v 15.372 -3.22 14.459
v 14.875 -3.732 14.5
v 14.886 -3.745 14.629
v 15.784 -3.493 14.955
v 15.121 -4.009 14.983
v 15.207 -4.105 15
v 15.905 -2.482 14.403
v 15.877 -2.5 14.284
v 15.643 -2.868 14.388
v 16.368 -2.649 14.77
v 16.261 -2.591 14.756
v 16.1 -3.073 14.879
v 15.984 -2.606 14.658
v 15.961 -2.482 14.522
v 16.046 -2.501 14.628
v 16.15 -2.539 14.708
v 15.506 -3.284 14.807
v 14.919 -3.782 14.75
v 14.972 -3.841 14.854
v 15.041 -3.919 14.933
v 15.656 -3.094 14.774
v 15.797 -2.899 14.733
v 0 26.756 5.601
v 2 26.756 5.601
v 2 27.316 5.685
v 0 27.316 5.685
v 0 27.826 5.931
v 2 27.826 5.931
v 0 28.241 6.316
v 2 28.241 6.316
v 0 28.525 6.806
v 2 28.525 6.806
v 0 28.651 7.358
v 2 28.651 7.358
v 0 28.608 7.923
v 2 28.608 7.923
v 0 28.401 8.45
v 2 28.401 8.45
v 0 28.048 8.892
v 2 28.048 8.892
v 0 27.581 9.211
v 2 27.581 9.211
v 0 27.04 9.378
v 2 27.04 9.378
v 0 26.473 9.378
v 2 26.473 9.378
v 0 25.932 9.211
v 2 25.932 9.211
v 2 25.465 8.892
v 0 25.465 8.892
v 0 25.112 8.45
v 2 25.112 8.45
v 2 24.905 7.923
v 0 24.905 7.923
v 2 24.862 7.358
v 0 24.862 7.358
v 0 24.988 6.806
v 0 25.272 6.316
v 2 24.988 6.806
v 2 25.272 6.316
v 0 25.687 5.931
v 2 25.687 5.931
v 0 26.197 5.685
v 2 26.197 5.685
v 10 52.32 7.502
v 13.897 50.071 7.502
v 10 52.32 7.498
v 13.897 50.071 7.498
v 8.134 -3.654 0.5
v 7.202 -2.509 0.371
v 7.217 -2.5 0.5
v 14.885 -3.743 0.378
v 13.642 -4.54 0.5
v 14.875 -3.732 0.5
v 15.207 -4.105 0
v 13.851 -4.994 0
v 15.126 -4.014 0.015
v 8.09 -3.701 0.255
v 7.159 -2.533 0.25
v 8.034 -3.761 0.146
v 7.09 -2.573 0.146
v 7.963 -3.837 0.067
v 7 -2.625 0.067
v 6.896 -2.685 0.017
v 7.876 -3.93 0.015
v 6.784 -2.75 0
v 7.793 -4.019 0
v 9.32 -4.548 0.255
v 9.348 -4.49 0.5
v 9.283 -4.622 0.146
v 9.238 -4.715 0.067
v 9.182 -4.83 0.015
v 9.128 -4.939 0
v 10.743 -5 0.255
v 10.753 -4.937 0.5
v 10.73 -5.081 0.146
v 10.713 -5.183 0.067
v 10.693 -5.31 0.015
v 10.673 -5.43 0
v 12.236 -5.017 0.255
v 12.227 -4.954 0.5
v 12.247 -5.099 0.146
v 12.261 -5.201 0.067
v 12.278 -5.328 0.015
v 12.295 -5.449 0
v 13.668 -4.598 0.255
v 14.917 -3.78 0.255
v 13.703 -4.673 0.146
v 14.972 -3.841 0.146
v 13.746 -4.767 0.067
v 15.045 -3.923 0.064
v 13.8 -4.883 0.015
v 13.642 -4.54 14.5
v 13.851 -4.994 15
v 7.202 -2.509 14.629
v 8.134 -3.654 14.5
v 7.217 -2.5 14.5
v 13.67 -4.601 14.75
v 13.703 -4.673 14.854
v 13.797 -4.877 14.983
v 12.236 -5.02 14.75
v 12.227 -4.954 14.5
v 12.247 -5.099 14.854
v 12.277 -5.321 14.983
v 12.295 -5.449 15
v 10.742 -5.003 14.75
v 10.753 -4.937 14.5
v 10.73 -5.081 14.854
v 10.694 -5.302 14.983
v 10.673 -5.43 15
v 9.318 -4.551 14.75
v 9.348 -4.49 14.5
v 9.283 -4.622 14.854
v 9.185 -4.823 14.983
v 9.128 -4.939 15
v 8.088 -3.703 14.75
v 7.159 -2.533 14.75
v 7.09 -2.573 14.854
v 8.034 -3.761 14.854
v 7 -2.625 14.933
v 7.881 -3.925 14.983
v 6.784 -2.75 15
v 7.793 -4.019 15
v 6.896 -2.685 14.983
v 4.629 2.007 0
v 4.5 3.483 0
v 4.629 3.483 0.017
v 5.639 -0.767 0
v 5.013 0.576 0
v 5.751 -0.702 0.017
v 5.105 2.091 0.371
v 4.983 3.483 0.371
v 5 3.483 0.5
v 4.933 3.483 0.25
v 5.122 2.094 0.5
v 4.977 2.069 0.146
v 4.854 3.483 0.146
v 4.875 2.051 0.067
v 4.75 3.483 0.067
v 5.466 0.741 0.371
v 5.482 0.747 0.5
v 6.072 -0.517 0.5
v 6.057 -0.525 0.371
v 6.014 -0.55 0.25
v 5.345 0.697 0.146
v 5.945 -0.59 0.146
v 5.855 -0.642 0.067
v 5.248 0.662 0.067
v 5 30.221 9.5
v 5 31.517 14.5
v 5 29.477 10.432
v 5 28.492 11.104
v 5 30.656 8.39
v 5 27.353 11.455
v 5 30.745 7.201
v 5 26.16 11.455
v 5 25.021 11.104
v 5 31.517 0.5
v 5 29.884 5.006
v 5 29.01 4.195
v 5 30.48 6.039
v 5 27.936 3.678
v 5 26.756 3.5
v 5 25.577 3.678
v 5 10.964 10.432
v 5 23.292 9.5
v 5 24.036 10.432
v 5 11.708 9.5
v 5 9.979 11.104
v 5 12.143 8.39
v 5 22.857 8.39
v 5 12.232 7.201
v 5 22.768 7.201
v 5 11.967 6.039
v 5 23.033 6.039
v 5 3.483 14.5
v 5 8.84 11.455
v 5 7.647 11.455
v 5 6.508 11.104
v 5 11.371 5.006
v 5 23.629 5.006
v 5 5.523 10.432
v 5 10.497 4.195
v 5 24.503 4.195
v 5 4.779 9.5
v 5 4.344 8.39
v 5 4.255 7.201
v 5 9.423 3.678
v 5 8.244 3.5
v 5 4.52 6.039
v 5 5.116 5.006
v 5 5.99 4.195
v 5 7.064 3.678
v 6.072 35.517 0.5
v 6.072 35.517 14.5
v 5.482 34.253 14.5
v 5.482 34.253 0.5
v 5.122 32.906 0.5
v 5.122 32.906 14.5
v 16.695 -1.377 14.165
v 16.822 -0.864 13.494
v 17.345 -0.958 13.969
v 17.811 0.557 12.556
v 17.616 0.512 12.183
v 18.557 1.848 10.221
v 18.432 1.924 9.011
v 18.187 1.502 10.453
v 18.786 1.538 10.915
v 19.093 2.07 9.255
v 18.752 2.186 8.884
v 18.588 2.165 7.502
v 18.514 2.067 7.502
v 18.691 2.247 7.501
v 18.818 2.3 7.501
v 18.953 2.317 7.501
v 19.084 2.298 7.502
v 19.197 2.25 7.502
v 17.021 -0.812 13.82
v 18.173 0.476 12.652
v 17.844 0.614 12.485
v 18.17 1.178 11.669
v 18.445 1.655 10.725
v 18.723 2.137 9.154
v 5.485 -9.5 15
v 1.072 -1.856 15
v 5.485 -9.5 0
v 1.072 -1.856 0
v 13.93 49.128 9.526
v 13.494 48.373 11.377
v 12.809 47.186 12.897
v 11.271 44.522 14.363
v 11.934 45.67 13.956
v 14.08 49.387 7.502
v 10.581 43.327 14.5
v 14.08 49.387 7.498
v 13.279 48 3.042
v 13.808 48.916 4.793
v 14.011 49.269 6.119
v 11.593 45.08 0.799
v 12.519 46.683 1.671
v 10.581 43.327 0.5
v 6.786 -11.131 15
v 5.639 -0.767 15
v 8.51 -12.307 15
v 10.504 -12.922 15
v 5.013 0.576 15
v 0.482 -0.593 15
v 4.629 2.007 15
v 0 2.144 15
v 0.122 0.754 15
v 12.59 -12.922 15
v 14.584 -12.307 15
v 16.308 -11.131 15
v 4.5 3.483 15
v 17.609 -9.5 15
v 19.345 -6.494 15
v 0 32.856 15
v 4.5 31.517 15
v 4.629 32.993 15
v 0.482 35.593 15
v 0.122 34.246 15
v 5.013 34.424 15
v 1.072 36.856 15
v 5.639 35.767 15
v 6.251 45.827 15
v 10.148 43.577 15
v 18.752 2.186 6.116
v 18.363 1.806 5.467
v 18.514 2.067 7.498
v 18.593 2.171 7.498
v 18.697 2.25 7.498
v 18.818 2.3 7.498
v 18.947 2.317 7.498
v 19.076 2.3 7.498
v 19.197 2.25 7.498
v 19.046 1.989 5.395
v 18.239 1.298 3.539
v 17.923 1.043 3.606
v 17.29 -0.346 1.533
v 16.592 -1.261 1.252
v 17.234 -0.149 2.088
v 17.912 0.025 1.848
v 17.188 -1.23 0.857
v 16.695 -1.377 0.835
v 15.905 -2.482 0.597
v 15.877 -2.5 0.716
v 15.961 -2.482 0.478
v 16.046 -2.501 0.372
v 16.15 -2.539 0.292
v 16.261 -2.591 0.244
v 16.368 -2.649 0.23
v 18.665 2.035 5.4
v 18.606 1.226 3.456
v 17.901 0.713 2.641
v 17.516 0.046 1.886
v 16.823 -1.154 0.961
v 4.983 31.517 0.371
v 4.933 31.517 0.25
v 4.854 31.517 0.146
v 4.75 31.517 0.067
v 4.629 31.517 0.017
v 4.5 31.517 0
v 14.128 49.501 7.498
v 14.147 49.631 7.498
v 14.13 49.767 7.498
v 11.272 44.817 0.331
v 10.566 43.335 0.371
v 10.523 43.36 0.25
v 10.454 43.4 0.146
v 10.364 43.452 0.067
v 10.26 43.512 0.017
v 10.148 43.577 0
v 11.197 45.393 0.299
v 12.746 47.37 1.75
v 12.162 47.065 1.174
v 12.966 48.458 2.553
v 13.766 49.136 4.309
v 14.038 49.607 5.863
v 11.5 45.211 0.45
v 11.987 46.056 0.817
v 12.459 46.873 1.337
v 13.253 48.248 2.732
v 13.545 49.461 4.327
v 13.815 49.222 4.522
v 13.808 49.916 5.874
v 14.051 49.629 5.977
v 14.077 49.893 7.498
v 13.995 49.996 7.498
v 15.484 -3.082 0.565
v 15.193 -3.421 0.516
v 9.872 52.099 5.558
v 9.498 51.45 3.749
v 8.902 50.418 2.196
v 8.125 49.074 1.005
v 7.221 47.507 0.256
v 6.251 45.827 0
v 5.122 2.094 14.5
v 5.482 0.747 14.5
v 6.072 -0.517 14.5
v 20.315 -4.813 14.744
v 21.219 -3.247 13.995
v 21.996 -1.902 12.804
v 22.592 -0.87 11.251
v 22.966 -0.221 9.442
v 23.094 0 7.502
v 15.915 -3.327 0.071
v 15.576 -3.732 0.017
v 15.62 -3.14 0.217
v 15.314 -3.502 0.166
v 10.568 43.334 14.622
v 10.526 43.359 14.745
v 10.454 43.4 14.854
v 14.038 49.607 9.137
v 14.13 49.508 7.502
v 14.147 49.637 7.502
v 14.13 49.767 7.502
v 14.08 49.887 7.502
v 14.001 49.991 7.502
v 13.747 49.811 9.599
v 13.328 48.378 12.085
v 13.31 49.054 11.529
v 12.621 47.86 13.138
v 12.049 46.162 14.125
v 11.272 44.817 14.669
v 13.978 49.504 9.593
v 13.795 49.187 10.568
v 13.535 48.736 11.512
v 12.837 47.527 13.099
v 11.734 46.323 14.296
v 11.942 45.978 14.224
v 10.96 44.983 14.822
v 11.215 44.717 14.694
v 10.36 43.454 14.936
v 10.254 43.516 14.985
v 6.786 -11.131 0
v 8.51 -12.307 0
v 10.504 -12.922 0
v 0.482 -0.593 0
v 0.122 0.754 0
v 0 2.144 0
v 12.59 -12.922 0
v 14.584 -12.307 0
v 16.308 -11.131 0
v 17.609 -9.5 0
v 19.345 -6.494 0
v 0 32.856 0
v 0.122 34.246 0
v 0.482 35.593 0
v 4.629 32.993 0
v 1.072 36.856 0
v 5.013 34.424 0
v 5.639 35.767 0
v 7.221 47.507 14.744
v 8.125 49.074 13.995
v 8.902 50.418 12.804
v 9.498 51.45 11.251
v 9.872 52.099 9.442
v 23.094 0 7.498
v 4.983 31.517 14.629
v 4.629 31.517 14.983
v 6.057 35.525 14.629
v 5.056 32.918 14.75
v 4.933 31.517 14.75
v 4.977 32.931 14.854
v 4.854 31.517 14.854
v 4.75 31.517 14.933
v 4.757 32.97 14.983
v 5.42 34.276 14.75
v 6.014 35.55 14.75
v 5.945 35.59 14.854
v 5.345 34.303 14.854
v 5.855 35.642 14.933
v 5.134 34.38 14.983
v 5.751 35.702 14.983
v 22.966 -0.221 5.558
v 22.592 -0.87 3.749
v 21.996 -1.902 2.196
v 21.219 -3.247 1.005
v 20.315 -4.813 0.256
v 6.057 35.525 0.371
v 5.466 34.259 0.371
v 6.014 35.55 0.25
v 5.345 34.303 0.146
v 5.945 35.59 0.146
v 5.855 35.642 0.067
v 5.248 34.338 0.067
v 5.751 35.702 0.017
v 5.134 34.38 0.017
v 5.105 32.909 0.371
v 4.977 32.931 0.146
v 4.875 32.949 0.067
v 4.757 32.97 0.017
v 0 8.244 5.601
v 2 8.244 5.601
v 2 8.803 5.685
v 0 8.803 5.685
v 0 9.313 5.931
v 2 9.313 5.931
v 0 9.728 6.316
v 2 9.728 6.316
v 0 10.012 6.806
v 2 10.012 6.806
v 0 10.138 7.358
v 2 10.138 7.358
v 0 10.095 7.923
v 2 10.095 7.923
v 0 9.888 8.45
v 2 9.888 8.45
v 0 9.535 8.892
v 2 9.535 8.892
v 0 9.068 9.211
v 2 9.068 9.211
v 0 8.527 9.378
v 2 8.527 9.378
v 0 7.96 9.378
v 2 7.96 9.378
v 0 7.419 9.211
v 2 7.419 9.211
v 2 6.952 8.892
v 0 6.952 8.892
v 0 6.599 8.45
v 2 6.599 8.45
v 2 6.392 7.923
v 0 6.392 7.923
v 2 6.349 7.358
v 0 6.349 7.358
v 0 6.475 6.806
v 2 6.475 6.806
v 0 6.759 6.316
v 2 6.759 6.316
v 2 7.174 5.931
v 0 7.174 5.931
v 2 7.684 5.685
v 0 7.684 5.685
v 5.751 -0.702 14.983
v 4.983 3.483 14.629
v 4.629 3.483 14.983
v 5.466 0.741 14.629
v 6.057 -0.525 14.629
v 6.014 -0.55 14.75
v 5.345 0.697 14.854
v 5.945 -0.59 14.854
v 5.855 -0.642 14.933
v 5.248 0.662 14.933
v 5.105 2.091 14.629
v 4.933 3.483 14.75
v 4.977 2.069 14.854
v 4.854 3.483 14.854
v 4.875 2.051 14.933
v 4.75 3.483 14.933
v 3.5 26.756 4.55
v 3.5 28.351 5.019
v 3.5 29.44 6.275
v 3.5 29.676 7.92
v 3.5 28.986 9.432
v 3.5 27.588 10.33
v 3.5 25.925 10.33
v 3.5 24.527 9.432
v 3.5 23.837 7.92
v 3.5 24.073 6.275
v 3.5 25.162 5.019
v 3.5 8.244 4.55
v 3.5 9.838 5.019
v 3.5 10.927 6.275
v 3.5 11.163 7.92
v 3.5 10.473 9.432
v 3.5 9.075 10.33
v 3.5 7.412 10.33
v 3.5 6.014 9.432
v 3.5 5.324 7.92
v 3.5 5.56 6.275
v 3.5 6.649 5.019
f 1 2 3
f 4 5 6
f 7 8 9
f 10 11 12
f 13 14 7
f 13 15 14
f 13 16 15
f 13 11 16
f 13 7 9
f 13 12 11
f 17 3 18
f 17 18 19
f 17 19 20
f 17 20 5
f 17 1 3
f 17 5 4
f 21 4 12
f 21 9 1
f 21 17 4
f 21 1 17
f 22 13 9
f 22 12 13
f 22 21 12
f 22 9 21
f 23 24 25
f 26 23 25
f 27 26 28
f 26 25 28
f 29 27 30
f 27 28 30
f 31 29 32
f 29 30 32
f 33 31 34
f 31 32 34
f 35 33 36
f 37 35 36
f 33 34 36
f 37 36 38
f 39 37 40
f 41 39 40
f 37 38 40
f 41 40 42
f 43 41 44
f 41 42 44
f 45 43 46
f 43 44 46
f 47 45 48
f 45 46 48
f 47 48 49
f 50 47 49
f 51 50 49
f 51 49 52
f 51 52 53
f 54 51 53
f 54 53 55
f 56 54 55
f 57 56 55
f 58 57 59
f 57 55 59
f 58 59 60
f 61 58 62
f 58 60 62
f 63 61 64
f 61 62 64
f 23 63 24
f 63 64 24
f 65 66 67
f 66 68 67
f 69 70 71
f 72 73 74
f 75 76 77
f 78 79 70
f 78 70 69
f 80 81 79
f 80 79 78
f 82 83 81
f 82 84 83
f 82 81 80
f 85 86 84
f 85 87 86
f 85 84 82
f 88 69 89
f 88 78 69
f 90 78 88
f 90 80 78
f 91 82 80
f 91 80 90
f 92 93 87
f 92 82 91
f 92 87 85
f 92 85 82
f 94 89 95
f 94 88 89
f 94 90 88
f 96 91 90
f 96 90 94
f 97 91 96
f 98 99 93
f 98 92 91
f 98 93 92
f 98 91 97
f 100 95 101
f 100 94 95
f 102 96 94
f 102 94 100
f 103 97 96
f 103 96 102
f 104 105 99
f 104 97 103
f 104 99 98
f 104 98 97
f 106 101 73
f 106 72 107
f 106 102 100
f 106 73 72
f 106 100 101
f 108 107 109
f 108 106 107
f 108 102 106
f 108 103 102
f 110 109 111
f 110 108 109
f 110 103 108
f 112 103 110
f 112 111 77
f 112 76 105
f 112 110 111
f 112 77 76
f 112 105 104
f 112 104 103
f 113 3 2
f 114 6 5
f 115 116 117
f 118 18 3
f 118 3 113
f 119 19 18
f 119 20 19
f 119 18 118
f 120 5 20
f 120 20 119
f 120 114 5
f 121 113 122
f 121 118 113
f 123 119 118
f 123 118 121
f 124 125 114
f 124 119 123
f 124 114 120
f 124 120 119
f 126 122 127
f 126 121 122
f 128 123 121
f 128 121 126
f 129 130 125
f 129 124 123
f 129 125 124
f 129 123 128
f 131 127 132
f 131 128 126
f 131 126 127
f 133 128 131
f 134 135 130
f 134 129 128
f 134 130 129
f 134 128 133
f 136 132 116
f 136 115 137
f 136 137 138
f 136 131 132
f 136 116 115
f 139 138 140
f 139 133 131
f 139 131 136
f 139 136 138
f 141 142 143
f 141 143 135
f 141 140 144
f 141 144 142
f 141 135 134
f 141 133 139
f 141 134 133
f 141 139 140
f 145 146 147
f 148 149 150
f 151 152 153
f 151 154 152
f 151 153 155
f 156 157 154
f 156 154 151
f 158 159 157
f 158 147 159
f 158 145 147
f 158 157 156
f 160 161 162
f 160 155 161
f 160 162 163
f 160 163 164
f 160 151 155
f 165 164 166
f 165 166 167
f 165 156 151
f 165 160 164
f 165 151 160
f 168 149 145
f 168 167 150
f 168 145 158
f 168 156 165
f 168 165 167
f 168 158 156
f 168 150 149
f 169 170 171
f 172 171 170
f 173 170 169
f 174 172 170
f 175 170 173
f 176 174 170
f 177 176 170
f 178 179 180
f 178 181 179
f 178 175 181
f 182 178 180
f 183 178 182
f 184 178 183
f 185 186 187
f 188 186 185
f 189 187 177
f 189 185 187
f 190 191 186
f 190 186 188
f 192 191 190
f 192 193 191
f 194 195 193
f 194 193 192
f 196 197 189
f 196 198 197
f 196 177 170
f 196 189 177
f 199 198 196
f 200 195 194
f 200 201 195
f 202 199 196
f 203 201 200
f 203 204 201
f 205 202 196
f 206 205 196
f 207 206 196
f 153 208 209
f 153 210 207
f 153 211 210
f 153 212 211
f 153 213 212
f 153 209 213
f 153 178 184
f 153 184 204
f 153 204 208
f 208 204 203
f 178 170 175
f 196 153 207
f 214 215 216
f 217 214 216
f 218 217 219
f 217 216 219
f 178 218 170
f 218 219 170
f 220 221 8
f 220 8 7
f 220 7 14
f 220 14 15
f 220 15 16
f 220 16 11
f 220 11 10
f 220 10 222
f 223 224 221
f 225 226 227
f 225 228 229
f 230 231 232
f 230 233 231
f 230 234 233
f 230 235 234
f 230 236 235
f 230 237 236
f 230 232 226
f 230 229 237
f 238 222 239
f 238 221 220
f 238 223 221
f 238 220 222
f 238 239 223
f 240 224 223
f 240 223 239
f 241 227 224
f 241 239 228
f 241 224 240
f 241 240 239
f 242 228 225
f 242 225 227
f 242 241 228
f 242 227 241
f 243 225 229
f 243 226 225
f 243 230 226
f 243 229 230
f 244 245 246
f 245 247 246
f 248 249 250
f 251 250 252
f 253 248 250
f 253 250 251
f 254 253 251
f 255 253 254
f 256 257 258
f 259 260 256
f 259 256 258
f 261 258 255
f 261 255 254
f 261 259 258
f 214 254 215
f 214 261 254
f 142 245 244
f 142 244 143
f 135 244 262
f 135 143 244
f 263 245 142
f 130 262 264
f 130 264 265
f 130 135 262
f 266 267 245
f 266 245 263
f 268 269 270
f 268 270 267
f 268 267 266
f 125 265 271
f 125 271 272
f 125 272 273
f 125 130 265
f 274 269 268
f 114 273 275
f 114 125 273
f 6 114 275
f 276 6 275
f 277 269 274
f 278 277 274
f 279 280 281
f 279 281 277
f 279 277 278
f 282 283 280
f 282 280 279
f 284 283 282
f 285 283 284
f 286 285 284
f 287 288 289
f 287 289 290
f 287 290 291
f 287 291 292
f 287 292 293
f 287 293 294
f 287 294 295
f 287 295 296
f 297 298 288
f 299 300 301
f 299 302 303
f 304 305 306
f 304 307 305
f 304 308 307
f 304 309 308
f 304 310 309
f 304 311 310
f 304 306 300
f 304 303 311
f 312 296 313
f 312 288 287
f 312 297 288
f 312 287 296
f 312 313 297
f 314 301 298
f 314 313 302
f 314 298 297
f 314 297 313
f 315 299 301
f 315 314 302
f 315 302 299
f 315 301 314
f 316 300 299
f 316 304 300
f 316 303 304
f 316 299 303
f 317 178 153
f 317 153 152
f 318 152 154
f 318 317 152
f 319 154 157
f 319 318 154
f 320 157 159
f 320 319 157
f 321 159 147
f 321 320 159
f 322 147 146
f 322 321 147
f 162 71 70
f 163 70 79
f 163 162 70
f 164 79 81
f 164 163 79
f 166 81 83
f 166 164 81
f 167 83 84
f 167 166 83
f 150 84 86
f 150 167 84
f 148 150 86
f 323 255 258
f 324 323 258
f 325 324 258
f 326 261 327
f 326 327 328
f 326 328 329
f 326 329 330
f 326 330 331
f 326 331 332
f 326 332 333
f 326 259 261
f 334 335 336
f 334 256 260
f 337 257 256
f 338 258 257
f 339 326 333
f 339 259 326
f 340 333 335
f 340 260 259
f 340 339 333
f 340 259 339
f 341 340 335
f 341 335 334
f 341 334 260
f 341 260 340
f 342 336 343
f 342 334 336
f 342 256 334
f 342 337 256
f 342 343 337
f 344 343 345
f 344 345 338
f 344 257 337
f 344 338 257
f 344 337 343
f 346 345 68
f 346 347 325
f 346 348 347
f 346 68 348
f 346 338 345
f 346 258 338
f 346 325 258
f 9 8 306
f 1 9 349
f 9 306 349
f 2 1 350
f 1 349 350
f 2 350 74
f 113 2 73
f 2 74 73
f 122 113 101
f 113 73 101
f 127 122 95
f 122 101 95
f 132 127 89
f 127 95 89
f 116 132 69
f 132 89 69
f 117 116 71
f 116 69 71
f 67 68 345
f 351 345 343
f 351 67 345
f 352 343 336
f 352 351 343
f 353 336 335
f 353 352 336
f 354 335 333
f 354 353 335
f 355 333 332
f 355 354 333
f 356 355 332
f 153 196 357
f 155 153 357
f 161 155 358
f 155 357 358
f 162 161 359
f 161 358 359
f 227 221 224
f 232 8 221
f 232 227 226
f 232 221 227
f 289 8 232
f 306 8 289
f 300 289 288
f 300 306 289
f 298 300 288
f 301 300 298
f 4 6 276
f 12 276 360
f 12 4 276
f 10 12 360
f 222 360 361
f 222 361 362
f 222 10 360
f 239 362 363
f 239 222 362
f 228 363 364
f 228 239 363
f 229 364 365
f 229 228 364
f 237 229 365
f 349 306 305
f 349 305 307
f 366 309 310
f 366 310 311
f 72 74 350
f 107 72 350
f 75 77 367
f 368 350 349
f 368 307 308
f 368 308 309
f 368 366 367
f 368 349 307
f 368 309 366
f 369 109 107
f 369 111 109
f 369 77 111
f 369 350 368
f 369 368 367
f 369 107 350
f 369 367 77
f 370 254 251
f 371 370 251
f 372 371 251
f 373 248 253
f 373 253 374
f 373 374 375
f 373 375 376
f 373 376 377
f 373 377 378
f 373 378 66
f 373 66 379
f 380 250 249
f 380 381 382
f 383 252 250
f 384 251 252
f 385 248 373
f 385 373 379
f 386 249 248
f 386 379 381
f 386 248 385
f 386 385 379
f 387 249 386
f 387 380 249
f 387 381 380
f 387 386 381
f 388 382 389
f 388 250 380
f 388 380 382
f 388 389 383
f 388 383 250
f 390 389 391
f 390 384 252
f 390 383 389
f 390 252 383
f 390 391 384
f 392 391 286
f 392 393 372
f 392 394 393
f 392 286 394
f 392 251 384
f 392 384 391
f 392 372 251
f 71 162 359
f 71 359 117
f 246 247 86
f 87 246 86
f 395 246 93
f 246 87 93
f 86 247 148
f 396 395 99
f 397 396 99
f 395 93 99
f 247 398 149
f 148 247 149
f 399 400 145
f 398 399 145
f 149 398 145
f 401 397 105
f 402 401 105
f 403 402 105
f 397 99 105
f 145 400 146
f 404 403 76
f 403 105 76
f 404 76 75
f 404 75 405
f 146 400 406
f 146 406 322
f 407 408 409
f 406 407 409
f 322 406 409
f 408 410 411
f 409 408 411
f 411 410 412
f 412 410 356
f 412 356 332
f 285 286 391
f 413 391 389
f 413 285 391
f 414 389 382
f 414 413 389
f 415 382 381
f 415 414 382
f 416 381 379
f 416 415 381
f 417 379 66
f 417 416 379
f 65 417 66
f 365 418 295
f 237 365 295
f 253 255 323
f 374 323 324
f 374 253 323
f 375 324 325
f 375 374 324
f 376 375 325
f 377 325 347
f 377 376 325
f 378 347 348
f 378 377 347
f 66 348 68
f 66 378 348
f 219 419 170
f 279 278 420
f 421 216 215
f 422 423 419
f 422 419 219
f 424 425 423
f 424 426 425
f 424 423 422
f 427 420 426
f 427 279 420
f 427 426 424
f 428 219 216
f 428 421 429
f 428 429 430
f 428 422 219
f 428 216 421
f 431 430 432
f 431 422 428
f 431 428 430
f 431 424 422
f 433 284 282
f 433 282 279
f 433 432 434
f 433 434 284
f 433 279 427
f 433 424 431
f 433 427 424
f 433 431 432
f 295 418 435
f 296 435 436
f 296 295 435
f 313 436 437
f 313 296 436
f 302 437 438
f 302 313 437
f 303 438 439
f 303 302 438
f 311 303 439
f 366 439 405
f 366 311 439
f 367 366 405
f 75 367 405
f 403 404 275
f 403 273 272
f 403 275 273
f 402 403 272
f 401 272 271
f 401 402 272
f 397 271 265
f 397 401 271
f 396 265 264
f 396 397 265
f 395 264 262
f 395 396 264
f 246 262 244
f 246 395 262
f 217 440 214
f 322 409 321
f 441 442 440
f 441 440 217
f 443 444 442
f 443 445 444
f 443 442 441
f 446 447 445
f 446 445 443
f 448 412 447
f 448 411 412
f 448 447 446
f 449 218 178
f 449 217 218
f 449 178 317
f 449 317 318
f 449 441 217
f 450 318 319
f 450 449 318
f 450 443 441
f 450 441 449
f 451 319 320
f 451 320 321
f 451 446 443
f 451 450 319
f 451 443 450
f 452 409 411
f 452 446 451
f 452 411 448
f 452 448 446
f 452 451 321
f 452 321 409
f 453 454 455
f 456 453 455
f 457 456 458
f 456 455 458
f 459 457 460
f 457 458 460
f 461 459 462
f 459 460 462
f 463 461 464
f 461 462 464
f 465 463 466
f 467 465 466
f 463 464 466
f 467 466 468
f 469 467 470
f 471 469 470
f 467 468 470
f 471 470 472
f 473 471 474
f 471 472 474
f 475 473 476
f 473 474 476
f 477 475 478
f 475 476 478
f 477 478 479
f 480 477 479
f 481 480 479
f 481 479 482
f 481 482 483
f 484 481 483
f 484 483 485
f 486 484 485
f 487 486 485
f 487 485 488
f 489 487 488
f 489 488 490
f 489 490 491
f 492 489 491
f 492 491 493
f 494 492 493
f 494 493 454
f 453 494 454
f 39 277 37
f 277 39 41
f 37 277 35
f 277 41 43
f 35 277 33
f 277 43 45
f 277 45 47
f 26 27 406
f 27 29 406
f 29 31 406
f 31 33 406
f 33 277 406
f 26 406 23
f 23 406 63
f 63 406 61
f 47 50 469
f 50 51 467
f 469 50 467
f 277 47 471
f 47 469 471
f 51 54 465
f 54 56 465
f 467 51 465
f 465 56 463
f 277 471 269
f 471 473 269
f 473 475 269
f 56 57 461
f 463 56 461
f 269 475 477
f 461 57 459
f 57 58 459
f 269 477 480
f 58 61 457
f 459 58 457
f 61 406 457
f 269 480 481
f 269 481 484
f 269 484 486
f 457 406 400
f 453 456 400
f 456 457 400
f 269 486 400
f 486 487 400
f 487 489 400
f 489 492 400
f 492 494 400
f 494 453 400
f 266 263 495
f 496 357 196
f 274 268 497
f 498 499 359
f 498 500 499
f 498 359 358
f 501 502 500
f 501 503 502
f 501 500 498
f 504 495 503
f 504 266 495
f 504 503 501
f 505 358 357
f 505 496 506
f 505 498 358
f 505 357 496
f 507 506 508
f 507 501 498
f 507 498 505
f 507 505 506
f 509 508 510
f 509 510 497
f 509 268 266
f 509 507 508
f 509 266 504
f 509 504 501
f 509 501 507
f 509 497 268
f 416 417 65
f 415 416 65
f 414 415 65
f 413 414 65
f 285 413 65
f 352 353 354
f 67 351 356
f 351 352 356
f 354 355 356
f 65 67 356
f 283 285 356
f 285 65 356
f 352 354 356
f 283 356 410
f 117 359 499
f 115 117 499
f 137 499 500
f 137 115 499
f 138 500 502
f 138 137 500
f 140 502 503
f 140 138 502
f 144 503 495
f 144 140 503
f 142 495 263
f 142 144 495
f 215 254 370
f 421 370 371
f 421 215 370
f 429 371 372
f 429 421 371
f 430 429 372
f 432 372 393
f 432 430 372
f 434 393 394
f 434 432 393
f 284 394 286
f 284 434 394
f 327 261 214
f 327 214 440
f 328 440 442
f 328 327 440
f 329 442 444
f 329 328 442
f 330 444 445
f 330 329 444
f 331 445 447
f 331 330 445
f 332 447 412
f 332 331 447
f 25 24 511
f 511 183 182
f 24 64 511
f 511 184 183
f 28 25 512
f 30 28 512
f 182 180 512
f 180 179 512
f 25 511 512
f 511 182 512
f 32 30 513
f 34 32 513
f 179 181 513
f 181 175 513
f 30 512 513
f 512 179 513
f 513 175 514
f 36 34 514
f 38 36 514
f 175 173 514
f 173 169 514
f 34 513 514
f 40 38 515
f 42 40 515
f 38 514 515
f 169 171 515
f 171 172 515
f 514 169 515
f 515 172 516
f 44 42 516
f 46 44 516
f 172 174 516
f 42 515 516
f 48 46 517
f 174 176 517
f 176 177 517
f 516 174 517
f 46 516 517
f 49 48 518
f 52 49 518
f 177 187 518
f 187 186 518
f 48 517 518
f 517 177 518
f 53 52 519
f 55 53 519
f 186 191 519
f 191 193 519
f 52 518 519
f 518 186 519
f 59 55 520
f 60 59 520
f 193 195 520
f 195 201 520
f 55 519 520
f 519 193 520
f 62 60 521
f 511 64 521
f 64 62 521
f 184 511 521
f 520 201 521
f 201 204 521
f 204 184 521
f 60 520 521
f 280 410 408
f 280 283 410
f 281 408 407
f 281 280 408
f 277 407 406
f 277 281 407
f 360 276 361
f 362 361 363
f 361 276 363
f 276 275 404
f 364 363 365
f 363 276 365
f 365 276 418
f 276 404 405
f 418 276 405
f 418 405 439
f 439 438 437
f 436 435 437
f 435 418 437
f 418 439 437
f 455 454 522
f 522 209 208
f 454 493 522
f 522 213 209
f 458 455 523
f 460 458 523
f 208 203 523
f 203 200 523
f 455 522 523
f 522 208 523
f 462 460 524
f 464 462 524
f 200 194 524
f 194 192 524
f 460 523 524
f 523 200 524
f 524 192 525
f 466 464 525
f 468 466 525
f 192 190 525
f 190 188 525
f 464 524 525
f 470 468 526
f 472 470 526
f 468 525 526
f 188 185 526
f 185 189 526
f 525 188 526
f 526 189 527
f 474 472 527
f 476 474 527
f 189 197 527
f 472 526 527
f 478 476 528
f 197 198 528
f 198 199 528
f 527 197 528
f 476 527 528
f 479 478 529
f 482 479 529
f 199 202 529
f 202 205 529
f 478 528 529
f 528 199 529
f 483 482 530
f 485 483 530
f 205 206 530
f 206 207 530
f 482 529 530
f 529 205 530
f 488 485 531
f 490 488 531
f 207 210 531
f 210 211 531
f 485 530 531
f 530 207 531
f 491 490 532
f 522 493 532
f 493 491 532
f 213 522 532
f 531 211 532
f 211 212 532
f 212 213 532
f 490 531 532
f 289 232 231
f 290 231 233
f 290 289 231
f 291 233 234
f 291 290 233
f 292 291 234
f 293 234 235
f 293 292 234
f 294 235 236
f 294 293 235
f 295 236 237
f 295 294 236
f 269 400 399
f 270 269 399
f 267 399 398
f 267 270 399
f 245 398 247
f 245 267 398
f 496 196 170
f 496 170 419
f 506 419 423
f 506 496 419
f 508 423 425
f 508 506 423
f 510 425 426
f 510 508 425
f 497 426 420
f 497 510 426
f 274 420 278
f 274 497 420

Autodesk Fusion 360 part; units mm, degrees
sketch "Sketch1" plane through (0, 0, 0) normal (0, 0, 1) x (1, 0, 0)
  line L0 (10, 52.3205) -> (0, 35)
  line L1 (0, 35) -> (0, 0)
  line L2 (0, 0) -> (5.4848, -9.5)
  line L3 (17.6092, -9.5) -> (23.094, 0)
  line L4 (14.3301, 49.8205) -> (5, 33.6603)
  line L5 (5, 33.6603) -> (5, 1.3397)
  line L6 (5, 1.3397) -> (7.2169, -2.5)
  line L7 (15.8771, -2.5) -> (18.7639, 2.5)
  line L8 (23.094, 0) -> (18.7639, 2.5)
  line L9 (14.3301, 49.8205) -> (10, 52.3205)
  arc A0 (7.2169, -2.5) -> (15.8771, -2.5) centre (11.547, 0) ccw
  arc A1 (5.4848, -9.5) -> (17.6092, -9.5) centre (11.547, -6) ccw
  point P0 (11.547, -20)
  dimension "d1" = 35
  dimension "d2" = 20
  dimension "d3" = 20
  dimension "d4" = 20
  dimension "d5" = 150
  dimension "d6" = 150
  dimension "d8" = 5
  dimension "d9" = 7
extrude "Extrude1" add sketch "Sketch1" along normal blind 15
sketch "Sketch2" plane through (5, 0, 0) normal (1, 0, 0) x (0, 0, -1)
  line L0 (0, 1.3397) -> (0, 33.6603)
  line L1 (0, 33.6603) -> (-15, 33.6603)
  line L2 (-15, 33.6603) -> (-15, 1.3397)
  line L3 (-15, 1.3397) -> (0, 1.3397)
  line L4 (-7.5, 1.3397) -> (-7.5, 33.6603) construction
  line L5 (-15, 17.5) -> (0, 17.5) construction
  circle A0 centre (-7.5, 26.7565) radius 4
  circle A1 centre (-7.5, 8.2435) radius 4
  dimension "d12" = 8
  dimension "d13" = 6.9037
extrude "Extrude2" cut sketch "Sketch2" against normal blind 3 draft -35 contours A0 | A1
extrude "Extrude3" cut 2 faces at (2, 27.3459, 7.7313) (2, 8.7385, 7.1999) along direction (-1, 0, 0) through all
fillet "Fillet1" radius 7.5 4 edges at (20.9289, 1.25, 15) (20.9289, 1.25, 0) (12.1651, 51.0705, 15) (12.1651, 51.0705, 0)
fillet "Fillet2" radius 8 4 edges at (5, 1.3397, 7.5) (0, 0, 7.5) (0, 35, 7.5) (5, 33.6603, 7.5)
fillet "Fillet3" radius 0.5 16 edges at (5.2726, 33.5872, 15) (8.326, 39.421, 15) (14.3301, 49.8205, 7.5) (8.326, 39.421, 0) (5.2726, 33.5872, 0) (5, 17.5, 0) (5.2726, 1.4128, 0) (6.6443, -1.5083, 0) (10.6702, -4.9225, 0) (15.3815, -3.2072, 0.0512) (18.7639, 2.5, 7.5) (15.3815, -3.2072, 14.9488) (10.6702, -4.9225, 15) (6.6443, -1.5083, 15) (5.2726, 1.4128, 15) (5, 17.5, 15)
equation "d3 = d2"
equation "d4 = d2"
equation "d6 = d5"
